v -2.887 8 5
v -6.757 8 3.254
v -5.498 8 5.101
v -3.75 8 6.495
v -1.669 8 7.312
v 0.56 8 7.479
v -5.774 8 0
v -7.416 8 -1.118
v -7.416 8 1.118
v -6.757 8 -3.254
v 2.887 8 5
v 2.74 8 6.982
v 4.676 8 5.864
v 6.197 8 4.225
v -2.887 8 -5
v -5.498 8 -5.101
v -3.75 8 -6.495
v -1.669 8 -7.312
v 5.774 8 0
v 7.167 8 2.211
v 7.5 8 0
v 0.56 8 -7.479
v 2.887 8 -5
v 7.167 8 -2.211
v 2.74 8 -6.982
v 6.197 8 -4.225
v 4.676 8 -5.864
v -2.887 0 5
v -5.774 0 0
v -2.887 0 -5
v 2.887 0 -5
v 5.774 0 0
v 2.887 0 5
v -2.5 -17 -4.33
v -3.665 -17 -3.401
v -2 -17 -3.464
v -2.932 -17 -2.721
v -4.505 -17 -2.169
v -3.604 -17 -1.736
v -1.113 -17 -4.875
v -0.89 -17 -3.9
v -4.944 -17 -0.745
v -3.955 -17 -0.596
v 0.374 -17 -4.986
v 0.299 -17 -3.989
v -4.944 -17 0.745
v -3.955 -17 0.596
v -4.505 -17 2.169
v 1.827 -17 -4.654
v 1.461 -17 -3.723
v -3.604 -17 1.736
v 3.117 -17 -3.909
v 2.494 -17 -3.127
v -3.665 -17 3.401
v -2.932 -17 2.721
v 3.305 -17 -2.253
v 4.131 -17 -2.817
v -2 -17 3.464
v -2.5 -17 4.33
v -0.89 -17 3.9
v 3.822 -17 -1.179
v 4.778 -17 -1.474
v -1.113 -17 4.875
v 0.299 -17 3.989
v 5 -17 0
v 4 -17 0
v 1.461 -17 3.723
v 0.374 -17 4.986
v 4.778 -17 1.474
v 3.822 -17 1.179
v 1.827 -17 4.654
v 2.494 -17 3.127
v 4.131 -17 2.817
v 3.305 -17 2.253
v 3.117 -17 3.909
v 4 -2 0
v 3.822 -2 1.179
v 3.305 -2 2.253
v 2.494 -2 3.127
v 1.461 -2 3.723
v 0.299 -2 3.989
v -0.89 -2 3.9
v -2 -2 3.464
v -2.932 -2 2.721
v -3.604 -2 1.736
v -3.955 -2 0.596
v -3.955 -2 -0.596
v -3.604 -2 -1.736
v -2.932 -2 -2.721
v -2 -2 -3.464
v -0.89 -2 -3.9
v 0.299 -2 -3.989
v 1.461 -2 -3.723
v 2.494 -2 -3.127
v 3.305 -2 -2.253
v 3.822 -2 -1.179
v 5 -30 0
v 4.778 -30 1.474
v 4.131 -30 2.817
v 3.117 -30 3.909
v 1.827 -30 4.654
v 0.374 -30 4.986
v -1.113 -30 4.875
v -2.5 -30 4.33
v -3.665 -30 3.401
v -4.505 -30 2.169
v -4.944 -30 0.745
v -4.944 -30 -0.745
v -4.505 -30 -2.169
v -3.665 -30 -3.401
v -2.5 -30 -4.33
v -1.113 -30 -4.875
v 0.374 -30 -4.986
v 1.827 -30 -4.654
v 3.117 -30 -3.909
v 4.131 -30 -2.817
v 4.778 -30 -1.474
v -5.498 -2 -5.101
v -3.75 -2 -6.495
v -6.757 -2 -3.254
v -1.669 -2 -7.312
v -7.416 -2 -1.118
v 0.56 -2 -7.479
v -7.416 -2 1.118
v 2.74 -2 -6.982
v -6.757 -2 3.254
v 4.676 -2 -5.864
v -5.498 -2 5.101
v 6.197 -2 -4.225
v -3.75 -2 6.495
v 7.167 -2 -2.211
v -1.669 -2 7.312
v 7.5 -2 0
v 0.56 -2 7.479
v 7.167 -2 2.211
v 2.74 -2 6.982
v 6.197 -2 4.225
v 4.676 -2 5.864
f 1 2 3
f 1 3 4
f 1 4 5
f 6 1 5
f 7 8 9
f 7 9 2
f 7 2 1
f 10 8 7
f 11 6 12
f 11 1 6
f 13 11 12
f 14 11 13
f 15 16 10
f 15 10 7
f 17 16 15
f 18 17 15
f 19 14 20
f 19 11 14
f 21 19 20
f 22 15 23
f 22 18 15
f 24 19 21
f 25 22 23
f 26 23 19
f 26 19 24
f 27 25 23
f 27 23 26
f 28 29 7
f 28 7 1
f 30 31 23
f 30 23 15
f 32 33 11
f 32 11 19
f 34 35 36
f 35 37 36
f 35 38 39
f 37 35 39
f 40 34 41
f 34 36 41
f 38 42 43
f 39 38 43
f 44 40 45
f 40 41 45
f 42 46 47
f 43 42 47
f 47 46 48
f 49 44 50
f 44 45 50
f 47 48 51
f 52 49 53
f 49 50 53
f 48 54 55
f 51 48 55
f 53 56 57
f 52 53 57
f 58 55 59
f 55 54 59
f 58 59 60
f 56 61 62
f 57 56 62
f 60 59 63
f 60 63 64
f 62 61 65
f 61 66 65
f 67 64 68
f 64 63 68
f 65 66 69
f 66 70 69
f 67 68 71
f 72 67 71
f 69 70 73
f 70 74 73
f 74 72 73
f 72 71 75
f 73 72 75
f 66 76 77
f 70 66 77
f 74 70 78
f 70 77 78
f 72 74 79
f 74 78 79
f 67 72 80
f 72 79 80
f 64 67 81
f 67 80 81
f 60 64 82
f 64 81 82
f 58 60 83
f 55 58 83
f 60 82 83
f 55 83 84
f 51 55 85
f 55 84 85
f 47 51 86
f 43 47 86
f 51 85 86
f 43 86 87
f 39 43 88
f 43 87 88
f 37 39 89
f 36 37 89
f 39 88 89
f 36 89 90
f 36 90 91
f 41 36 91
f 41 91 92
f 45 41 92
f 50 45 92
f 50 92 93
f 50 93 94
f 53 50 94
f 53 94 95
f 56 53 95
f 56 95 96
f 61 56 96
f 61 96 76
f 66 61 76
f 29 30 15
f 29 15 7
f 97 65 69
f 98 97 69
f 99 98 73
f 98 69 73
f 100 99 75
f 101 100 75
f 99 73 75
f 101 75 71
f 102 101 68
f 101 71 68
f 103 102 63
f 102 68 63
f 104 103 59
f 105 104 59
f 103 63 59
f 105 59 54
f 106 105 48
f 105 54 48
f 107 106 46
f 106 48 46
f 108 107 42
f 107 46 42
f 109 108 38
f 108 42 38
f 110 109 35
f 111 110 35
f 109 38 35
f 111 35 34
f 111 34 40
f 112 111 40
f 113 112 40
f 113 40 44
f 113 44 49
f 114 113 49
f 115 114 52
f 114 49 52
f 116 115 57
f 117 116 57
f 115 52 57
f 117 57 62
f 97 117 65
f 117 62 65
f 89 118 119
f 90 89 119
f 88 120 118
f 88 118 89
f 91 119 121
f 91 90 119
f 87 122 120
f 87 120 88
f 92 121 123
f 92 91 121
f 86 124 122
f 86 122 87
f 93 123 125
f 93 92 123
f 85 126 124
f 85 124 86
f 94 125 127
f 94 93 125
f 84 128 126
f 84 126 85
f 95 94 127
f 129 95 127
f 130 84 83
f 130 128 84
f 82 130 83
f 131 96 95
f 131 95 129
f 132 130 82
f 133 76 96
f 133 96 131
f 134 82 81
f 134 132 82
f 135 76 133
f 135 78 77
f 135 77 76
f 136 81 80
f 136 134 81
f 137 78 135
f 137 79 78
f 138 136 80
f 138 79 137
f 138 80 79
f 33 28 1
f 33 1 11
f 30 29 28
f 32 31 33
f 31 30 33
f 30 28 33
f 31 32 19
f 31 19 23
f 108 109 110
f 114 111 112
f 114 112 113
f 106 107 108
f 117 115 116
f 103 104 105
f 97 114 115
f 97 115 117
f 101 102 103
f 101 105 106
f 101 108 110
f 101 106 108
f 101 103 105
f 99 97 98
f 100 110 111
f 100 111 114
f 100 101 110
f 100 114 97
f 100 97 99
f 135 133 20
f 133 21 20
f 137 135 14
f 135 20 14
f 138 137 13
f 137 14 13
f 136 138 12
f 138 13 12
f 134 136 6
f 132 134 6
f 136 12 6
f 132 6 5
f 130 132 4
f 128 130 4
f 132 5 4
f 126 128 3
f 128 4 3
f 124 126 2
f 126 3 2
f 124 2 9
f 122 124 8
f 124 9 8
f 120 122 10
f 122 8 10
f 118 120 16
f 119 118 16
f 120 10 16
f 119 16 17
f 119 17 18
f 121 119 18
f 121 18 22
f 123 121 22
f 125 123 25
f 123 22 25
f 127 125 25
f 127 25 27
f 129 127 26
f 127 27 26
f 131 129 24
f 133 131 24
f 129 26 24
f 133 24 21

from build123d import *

# Parameters (mm, degrees)
SKETCH1_R           = 7.5
BOSS_EXTRUDE1_DEPTH = 8
BOSS_EXTRUDE2_START = 2
SKETCH2_R           = 7.5
BOSS_EXTRUDE2_DEPTH = 2
SKETCH2_3_R         = 4
BOSS_EXTRUDE3_DEPTH = 17
SKETCH3_R           = 5
BOSS_EXTRUDE4_DEPTH = 13


with BuildPart() as part:
    # Sketch1 → Boss-Extrude1 (new body)
    with BuildSketch(Plane(origin=(0, 0, 0), x_dir=(1, 0, 0), z_dir=(0, 1, 0))):
        Circle(SKETCH1_R)
        Polygon((5.773502692, 0), (2.886751346, 5), (-2.886751346, 5), (-5.773502692, 0), (-2.886751346, -5), (2.886751346, -5), align=None, mode=Mode.SUBTRACT)
    extrude(amount=BOSS_EXTRUDE1_DEPTH)

    # Sketch2 → Boss-Extrude2 (add)
    with BuildSketch(Plane.XZ.offset(BOSS_EXTRUDE2_START)):
        Circle(SKETCH2_R)
    extrude(amount=-BOSS_EXTRUDE2_DEPTH)

    # Sketch2<3> → Boss-Extrude3 (add)
    with BuildSketch(Plane.XZ):
        Circle(SKETCH2_3_R)
    extrude(amount=BOSS_EXTRUDE3_DEPTH)

    # Sketch3 → Boss-Extrude4 (add)
    with BuildSketch(Plane.XZ.offset(17)):
        Circle(SKETCH3_R)
    extrude(amount=BOSS_EXTRUDE4_DEPTH)


solid = part.part
